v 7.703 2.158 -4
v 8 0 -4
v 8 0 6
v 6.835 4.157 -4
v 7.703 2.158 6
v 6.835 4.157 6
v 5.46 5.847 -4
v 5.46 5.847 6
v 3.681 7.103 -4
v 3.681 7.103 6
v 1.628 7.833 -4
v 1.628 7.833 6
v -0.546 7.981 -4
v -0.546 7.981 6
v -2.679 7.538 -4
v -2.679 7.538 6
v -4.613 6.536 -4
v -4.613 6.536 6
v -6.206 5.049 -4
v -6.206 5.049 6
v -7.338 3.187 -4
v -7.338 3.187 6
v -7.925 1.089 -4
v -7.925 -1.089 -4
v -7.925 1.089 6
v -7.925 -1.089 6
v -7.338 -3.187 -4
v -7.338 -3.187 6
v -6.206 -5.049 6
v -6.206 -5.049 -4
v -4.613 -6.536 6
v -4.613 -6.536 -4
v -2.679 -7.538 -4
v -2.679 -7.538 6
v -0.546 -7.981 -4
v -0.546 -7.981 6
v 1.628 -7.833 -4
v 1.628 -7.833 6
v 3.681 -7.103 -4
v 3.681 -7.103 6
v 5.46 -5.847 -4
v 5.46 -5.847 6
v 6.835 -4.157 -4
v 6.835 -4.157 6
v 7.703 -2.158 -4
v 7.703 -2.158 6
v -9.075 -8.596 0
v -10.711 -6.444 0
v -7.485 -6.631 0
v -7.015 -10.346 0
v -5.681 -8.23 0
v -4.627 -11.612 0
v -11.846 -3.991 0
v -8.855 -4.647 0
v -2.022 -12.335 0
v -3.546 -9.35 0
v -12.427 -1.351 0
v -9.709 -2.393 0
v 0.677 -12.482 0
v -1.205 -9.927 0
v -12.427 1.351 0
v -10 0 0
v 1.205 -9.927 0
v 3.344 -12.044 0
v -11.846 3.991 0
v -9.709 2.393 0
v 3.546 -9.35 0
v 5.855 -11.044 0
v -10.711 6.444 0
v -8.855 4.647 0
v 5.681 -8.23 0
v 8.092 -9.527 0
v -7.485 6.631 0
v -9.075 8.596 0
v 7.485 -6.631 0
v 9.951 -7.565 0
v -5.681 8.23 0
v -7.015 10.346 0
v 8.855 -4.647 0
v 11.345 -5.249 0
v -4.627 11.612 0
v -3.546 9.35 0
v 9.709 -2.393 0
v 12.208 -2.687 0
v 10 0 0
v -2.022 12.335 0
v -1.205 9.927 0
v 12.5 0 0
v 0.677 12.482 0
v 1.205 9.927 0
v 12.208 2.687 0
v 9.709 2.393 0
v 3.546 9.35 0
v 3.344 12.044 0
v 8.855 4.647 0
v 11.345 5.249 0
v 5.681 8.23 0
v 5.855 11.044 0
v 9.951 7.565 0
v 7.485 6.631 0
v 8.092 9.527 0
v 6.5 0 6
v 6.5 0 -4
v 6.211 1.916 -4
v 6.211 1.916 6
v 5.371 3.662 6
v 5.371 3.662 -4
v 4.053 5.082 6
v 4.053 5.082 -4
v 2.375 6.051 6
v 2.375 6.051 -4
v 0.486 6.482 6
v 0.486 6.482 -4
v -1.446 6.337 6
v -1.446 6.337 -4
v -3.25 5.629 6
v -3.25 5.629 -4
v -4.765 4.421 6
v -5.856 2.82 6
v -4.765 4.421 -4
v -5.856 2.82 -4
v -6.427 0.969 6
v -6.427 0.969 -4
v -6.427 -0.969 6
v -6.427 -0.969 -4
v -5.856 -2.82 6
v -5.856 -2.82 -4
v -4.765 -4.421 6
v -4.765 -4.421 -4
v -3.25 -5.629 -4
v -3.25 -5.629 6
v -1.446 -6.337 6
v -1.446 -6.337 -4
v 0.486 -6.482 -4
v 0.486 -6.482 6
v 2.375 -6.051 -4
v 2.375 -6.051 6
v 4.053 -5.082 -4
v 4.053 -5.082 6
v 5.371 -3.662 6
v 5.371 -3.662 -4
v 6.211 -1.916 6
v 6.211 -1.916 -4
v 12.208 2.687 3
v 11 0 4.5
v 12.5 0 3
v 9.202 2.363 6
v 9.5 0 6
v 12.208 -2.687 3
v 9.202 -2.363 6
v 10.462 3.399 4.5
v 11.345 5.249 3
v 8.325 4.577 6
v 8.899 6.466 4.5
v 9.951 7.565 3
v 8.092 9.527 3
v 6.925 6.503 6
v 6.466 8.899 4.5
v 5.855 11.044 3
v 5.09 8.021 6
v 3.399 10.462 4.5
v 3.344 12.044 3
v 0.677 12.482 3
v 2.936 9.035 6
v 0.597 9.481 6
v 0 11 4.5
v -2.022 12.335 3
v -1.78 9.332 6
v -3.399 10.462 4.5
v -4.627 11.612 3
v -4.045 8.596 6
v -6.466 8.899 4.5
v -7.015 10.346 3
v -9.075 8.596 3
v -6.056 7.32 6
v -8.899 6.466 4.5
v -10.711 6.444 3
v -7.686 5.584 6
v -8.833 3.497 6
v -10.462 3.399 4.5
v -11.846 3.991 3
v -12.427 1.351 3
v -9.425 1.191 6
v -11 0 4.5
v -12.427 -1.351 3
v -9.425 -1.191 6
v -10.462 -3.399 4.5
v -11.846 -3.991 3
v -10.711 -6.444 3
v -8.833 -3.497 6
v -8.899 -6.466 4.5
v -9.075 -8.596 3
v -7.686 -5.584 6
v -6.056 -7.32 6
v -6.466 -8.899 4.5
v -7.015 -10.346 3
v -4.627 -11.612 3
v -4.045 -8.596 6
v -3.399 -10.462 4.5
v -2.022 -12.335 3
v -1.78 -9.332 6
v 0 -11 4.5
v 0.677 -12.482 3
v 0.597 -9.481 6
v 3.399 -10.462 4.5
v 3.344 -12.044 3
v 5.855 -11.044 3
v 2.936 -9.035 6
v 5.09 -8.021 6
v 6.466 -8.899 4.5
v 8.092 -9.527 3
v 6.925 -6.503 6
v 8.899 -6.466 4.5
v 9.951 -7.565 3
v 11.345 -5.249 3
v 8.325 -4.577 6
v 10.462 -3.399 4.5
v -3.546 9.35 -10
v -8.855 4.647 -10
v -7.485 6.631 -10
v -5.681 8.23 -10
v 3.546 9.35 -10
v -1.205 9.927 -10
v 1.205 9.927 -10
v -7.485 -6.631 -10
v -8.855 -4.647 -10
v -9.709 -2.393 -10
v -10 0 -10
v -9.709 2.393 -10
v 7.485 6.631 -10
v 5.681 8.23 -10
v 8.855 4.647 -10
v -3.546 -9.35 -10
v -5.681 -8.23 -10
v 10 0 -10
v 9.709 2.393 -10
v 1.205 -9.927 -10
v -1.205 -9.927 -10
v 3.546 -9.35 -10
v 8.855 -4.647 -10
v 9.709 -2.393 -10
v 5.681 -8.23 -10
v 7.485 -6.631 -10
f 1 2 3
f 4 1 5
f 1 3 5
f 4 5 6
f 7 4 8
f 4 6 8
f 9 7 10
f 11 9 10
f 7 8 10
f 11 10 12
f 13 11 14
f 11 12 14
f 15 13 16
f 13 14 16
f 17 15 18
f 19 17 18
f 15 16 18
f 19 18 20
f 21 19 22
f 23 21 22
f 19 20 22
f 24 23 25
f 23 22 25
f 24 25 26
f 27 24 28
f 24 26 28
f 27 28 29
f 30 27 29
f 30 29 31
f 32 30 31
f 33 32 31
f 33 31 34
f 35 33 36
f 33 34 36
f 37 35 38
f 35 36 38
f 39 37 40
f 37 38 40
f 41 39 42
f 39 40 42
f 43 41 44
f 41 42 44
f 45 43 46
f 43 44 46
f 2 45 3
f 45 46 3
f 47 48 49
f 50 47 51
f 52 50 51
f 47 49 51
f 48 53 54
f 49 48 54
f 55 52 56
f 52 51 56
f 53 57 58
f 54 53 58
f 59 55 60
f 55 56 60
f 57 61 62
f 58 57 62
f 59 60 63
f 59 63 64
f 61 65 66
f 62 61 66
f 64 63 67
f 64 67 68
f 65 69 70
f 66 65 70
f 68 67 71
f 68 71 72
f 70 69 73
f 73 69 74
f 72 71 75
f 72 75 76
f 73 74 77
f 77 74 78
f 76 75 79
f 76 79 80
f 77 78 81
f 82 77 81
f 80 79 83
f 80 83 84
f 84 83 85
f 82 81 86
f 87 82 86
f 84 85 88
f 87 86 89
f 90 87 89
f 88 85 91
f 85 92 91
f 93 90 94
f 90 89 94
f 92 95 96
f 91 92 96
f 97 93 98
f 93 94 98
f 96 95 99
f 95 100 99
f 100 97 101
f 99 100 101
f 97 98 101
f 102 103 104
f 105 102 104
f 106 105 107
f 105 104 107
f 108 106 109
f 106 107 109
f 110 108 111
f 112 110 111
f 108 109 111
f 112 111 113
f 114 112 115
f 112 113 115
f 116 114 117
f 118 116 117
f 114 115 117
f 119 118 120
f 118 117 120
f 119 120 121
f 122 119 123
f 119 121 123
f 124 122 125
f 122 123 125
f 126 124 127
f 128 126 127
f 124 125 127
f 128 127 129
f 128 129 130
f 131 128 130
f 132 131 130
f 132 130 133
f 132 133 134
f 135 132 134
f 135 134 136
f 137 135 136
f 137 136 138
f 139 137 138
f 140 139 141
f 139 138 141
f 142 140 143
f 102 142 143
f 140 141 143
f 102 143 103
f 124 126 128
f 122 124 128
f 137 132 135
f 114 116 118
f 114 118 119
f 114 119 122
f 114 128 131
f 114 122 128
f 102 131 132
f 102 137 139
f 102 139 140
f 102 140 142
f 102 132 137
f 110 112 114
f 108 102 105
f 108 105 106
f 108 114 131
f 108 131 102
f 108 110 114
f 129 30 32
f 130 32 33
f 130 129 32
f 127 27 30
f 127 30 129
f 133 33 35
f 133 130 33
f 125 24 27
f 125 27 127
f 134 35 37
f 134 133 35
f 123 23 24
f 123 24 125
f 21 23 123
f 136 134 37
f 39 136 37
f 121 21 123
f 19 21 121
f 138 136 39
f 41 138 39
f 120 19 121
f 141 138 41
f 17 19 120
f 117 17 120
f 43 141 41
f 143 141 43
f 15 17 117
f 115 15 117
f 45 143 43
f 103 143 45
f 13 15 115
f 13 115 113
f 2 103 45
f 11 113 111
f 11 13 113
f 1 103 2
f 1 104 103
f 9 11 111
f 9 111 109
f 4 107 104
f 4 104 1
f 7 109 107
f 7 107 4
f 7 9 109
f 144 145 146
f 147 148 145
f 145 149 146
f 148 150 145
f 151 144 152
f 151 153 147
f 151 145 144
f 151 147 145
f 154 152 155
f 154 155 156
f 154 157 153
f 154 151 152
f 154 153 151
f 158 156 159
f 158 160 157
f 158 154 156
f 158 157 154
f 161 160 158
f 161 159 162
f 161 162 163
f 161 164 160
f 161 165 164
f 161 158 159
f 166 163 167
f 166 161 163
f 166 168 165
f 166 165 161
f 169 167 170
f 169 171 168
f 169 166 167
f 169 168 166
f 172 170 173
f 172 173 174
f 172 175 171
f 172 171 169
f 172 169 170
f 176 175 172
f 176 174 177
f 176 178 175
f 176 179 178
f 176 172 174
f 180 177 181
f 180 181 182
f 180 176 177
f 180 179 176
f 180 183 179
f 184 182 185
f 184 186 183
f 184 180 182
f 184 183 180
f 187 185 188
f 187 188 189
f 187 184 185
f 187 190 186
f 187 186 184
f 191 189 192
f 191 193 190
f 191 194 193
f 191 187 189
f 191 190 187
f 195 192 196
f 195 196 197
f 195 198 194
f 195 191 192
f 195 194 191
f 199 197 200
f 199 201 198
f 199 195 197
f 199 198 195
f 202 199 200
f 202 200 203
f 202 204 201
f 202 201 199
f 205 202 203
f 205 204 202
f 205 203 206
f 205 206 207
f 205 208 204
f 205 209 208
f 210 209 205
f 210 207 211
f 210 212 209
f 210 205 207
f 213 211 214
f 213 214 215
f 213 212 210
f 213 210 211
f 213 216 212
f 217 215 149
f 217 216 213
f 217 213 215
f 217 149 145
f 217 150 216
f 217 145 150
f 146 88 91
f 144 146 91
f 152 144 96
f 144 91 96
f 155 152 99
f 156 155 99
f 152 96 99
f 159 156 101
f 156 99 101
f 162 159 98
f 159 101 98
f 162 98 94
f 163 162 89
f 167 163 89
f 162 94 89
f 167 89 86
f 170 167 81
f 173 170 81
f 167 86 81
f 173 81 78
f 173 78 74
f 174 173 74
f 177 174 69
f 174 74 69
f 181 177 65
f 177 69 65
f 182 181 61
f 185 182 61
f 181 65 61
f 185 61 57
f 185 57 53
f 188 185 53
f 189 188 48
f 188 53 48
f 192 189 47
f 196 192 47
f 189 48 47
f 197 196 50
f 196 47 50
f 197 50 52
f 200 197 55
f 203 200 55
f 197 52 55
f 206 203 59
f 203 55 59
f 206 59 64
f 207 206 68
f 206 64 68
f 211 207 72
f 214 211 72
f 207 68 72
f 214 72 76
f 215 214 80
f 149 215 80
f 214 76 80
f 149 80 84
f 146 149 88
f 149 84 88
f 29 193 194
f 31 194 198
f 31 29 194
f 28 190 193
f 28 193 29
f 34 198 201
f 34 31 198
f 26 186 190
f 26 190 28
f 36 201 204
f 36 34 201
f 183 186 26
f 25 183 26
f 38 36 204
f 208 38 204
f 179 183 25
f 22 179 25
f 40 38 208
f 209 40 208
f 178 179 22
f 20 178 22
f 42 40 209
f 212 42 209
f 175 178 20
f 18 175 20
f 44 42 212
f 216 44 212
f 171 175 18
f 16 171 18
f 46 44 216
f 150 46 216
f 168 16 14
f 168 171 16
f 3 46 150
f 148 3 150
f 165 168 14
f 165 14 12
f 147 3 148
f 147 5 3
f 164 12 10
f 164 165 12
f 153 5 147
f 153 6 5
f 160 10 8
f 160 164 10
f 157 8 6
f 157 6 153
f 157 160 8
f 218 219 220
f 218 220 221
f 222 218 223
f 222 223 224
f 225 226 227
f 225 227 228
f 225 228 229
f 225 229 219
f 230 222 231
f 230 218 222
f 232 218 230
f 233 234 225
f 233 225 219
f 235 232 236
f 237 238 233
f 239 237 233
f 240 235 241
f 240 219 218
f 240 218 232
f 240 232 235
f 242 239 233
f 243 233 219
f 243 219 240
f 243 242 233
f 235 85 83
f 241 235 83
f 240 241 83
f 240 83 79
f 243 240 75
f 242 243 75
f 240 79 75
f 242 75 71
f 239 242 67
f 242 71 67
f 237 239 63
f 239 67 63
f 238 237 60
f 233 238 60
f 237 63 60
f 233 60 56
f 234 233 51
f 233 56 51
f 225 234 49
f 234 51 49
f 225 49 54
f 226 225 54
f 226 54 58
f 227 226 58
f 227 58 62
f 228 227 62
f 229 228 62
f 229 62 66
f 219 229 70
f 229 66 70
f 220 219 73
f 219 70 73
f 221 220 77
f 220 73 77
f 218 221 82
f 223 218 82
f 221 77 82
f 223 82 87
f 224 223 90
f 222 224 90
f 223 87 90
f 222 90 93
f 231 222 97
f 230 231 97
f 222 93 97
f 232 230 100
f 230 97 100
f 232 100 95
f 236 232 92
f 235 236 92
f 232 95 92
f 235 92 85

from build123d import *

# Parameters (mm, degrees)
ESQUISSE1_R             = 12.5
BASE_EXTRUSION_DEPTH    = 6
CHANFREIN1_SIZE         = 3
ESQUISSE2_R             = 10
BOSS_EXTRU_1_DEPTH      = 10
ESQUISSE3_R             = 8
ENL_V_MAT_EXTRU_1_DEPTH = 10
ESQUISSE4_R             = 6.5
BOSS_EXTRU_2_DEPTH      = 10


with BuildPart() as part:
    # Esquisse1 → Base-Extrusion (new body)
    with BuildSketch(Plane.XY):
        Circle(ESQUISSE1_R)
    extrude(amount=BASE_EXTRUSION_DEPTH)

    # Chanfrein1
    chanfrein1_edges = [part.edges().sort_by_distance(p)[0] for p in [
        (-12.5, 0, 6),
    ]]
    chamfer(chanfrein1_edges, length=CHANFREIN1_SIZE)

    # Esquisse2 → Boss.-Extru.1 (add)
    with BuildSketch(Plane(origin=(0, 0, 0), x_dir=(-1, 0, 0), z_dir=(0, 0, -1))):
        with Locations(Location((0, 0, 0), (0, 0, 180))):
            Circle(ESQUISSE2_R)
    extrude(amount=BOSS_EXTRU_1_DEPTH)

    # Esquisse3 → Enlèv. mat.-Extru.1 (cut)
    with BuildSketch(Plane.XY.offset(6)):
        Circle(ESQUISSE3_R)
    extrude(amount=-ENL_V_MAT_EXTRU_1_DEPTH, mode=Mode.SUBTRACT)

    # Esquisse4 → Boss.-Extru.2 (add)
    with BuildSketch(Plane.XY.offset(-4)):
        Circle(ESQUISSE4_R)
    extrude(amount=BOSS_EXTRU_2_DEPTH)


solid = part.part
